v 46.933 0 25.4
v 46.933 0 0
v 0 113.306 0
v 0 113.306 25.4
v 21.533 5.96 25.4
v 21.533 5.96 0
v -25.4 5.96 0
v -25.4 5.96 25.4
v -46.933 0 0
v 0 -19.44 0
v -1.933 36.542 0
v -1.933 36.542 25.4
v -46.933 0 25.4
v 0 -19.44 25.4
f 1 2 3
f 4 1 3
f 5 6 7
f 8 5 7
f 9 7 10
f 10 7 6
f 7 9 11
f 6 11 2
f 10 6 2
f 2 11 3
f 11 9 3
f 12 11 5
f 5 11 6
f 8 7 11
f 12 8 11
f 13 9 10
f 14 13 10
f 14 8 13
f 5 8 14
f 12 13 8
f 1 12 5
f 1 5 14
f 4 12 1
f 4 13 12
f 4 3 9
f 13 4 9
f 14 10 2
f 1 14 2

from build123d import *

# Parameters (mm, degrees)
F1_DEPTH = 25.4


with BuildPart() as f1:
    # F0 (on Top) → F1 (new body)
    with BuildSketch(Plane.XY):
        Polygon((-46.93308, 0), (0, -19.440318), (46.93308, 0), (0, 113.306479), align=None)
        Polygon((21.53308, 5.959682), (-25.4, 5.959682), (-1.93346, 36.541872), align=None, mode=Mode.SUBTRACT)
    extrude(amount=F1_DEPTH)


solid = f1.part
